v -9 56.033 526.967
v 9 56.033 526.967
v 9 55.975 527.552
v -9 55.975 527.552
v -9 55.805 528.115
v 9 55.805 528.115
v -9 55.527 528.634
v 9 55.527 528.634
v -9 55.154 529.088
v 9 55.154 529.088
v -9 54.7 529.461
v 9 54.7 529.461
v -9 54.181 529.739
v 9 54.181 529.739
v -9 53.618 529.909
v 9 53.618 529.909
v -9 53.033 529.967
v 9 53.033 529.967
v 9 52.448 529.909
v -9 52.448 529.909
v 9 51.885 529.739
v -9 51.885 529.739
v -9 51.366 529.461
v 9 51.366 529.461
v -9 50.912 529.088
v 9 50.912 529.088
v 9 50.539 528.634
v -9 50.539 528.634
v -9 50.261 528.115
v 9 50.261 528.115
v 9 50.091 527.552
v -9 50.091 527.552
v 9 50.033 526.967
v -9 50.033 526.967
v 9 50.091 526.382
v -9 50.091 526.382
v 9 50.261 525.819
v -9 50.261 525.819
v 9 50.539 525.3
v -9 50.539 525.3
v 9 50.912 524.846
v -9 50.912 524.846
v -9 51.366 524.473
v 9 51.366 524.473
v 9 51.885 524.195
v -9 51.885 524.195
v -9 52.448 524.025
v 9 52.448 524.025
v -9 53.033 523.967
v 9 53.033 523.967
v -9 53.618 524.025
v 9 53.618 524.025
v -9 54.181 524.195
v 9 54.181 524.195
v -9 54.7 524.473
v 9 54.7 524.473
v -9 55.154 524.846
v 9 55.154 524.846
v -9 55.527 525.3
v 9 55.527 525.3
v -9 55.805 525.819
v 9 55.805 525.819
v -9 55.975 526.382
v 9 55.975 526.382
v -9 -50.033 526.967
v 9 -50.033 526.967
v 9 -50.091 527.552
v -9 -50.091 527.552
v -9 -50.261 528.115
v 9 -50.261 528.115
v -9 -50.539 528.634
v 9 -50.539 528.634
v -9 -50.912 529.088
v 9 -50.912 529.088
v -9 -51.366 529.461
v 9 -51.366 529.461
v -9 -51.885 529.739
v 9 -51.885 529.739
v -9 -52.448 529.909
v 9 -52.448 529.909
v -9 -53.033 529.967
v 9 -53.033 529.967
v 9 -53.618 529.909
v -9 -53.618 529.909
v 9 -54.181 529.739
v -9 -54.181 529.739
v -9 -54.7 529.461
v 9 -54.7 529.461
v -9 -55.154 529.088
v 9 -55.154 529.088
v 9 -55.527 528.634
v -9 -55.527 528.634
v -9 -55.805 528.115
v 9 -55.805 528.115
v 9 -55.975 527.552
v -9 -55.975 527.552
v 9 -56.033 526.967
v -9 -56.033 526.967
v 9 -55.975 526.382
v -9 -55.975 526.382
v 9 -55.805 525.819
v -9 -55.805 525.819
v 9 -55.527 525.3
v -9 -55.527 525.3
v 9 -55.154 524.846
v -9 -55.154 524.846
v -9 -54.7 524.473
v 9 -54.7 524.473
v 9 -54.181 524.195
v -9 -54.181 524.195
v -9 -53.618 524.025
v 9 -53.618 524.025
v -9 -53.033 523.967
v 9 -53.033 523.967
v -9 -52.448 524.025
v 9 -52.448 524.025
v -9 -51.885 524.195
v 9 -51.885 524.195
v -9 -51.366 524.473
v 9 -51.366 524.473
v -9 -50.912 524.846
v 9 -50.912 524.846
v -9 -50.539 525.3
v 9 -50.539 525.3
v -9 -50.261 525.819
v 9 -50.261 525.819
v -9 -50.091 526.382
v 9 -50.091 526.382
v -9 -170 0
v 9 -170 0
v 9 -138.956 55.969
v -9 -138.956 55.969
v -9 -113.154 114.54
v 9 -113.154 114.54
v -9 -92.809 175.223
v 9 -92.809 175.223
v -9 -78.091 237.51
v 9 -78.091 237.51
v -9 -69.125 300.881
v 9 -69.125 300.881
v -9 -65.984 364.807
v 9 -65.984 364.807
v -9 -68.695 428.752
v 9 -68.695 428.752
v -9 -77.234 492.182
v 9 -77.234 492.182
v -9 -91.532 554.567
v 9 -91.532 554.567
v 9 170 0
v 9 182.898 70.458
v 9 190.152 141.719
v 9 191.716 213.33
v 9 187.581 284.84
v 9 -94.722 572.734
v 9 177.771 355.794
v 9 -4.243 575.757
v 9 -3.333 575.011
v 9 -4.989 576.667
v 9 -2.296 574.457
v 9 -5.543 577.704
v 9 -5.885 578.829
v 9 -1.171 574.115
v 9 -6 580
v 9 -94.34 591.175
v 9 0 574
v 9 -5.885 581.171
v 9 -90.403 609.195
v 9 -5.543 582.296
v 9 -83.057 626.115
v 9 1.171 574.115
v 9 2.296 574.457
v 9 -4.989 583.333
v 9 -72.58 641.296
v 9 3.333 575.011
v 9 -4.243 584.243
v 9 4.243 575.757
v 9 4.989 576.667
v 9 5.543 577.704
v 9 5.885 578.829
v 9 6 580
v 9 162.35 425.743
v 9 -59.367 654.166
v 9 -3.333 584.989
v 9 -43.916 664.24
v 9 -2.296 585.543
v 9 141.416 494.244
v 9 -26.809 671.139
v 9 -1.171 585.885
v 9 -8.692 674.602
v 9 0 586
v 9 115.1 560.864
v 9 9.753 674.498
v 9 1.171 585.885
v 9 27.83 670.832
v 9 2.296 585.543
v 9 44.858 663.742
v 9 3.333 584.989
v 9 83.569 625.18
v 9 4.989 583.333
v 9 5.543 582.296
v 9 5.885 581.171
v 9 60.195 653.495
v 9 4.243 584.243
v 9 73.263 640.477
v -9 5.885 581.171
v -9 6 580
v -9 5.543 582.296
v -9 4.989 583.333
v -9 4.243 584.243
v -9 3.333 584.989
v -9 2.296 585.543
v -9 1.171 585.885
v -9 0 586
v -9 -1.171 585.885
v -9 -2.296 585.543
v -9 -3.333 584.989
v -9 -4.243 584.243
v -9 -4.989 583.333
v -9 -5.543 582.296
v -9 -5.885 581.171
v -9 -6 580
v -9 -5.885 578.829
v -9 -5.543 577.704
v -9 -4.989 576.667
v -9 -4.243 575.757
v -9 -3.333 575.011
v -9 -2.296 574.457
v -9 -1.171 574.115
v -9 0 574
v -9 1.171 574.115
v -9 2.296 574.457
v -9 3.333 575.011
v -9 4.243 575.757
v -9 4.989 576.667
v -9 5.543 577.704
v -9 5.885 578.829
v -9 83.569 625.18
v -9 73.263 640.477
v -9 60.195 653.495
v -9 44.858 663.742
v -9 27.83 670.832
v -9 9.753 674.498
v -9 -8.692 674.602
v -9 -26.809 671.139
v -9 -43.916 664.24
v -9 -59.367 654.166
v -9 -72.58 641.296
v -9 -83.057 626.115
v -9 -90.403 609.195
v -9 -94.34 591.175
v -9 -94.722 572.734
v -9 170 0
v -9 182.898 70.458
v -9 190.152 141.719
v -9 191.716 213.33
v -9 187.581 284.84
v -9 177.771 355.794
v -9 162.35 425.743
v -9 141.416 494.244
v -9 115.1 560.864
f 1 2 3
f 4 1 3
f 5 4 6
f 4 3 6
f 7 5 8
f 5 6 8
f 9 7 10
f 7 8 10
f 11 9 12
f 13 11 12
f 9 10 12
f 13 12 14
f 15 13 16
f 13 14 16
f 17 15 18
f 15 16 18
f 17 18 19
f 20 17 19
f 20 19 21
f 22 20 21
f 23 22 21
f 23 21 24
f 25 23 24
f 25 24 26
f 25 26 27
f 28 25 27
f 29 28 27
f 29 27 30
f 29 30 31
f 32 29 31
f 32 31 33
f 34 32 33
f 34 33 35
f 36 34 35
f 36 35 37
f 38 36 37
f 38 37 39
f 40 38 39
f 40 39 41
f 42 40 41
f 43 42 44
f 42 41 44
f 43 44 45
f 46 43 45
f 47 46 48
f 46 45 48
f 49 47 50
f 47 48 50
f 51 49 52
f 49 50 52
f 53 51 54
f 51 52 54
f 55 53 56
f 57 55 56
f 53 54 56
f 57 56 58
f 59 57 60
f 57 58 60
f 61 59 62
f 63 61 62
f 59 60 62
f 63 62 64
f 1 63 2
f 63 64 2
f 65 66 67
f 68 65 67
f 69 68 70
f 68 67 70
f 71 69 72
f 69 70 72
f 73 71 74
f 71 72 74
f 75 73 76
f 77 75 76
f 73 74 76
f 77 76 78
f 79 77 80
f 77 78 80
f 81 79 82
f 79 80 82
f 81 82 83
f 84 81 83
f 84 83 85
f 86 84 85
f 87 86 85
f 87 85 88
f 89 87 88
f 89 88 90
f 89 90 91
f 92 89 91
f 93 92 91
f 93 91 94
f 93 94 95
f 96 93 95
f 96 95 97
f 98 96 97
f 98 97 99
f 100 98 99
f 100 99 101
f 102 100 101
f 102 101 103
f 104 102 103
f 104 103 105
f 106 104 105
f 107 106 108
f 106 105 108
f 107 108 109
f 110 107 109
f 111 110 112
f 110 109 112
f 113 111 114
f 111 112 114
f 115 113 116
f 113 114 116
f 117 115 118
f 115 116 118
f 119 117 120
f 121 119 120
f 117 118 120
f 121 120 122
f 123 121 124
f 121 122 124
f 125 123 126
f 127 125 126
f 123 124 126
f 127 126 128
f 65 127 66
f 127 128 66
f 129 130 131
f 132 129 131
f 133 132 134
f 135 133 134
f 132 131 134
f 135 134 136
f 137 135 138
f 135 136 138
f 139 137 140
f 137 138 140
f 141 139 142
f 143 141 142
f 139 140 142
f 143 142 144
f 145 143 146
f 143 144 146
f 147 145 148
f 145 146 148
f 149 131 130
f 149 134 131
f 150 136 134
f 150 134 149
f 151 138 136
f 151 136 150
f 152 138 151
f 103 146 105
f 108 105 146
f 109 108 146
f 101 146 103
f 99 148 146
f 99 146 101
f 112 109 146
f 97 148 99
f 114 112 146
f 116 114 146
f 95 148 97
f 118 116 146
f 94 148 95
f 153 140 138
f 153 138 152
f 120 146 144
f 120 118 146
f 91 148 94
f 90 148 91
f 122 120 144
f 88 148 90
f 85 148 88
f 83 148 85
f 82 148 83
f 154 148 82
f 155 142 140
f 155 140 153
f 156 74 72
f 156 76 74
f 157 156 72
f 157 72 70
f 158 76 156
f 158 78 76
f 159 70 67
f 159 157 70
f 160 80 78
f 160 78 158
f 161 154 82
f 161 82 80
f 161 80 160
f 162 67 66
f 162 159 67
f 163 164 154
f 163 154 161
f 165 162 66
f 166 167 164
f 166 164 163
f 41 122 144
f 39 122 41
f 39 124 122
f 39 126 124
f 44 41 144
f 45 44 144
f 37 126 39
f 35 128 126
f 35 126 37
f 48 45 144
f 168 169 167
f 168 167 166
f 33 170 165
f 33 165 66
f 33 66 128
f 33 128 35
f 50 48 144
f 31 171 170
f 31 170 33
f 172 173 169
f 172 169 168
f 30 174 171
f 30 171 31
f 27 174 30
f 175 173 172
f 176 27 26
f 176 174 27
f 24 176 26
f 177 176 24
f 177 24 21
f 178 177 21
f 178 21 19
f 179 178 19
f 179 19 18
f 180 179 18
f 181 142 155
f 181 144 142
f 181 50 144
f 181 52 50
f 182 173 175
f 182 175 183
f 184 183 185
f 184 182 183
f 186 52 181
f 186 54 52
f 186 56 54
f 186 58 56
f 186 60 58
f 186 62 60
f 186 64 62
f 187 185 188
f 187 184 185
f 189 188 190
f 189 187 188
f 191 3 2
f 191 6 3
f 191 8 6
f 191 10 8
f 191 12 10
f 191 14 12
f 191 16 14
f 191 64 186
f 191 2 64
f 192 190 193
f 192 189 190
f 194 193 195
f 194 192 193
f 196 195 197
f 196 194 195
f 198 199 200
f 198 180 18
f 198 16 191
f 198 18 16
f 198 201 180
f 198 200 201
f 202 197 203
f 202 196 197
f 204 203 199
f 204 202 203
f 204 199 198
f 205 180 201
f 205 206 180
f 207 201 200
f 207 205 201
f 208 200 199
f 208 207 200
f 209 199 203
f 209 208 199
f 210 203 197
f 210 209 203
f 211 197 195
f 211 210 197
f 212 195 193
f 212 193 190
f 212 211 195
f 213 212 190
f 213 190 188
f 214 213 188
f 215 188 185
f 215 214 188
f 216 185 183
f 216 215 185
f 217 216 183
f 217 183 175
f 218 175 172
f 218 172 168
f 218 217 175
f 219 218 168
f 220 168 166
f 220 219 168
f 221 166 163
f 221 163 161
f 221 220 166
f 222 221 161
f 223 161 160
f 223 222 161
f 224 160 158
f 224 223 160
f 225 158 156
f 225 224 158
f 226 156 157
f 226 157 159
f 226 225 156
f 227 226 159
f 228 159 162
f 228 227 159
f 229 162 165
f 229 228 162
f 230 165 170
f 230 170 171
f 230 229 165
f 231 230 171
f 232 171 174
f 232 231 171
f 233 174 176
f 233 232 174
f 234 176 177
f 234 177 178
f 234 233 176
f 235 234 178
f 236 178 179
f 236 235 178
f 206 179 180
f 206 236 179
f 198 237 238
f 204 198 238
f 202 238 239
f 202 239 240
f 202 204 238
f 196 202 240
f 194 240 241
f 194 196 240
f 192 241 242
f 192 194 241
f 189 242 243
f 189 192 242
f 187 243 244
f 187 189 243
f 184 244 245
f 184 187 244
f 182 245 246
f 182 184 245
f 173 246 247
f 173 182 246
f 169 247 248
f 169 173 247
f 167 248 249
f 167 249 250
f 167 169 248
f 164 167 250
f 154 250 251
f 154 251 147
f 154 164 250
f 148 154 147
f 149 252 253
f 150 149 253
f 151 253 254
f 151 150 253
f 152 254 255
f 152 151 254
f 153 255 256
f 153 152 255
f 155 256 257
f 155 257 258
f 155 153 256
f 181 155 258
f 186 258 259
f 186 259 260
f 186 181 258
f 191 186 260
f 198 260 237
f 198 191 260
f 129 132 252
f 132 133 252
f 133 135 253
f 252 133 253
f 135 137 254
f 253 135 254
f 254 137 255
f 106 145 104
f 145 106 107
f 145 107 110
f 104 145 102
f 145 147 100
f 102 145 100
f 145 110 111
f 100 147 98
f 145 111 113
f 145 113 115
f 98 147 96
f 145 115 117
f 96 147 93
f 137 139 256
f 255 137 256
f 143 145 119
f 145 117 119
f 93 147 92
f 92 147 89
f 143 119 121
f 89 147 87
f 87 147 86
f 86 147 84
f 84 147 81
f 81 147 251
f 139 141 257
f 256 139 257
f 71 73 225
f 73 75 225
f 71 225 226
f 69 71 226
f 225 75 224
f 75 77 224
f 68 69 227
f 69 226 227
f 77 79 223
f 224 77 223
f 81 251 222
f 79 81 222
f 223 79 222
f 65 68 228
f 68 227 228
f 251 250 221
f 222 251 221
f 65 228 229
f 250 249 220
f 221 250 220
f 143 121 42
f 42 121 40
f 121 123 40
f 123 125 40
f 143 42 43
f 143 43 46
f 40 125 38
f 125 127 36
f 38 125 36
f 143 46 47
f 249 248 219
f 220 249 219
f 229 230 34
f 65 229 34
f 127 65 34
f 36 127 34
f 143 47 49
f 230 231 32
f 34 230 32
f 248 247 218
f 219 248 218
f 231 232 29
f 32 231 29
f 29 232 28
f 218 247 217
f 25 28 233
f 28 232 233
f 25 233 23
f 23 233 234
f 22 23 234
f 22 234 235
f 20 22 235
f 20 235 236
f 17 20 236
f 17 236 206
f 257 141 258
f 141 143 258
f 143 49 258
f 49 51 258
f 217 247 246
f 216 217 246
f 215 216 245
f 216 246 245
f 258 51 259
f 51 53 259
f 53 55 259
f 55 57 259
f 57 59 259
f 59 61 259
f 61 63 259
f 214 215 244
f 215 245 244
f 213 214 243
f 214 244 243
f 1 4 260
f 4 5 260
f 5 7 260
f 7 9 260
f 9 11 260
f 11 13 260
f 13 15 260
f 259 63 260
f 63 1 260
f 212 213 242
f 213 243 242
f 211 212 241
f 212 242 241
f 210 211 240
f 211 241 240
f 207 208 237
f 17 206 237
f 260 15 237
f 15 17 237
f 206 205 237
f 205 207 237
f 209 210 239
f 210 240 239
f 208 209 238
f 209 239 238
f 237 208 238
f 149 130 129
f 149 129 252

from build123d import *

# Parameters (mm, degrees)
SKETCH_R     = 6
PAD_DEPTH    = 9
SKETCH001_R  = 3
POCKET_DEPTH = 18.001


with BuildPart() as part:
    # Sketch → Pad (new body, symmetric)
    with BuildSketch(Plane.YZ):
        with BuildLine():
            ThreePointArc((83.569101, 625.179701), (-35.530366, 668.105579), (-91.532178, 554.56655))
            ThreePointArc((-170, 0), (-72.883506, 269.093239), (-91.532178, 554.56655))
            Line((-170, 0), (170, 0))
            ThreePointArc((170, 0), (183.382066, 320.41444), (83.569101, 625.179701))
        make_face()
        with Locations((0, 580)):
            Circle(SKETCH_R, mode=Mode.SUBTRACT)
    extrude(amount=PAD_DEPTH, both=True)

    # Sketch001 (on Face7 of Pad) → Pocket (cut, through all)
    with BuildSketch(Plane.YZ.offset(9)):
        with Locations((-53.033009, 526.966991)):
            Circle(SKETCH001_R)
        with Locations((53.033009, 526.966991)):
            Circle(SKETCH001_R)
    extrude(amount=-POCKET_DEPTH, mode=Mode.SUBTRACT)


solid = part.part
